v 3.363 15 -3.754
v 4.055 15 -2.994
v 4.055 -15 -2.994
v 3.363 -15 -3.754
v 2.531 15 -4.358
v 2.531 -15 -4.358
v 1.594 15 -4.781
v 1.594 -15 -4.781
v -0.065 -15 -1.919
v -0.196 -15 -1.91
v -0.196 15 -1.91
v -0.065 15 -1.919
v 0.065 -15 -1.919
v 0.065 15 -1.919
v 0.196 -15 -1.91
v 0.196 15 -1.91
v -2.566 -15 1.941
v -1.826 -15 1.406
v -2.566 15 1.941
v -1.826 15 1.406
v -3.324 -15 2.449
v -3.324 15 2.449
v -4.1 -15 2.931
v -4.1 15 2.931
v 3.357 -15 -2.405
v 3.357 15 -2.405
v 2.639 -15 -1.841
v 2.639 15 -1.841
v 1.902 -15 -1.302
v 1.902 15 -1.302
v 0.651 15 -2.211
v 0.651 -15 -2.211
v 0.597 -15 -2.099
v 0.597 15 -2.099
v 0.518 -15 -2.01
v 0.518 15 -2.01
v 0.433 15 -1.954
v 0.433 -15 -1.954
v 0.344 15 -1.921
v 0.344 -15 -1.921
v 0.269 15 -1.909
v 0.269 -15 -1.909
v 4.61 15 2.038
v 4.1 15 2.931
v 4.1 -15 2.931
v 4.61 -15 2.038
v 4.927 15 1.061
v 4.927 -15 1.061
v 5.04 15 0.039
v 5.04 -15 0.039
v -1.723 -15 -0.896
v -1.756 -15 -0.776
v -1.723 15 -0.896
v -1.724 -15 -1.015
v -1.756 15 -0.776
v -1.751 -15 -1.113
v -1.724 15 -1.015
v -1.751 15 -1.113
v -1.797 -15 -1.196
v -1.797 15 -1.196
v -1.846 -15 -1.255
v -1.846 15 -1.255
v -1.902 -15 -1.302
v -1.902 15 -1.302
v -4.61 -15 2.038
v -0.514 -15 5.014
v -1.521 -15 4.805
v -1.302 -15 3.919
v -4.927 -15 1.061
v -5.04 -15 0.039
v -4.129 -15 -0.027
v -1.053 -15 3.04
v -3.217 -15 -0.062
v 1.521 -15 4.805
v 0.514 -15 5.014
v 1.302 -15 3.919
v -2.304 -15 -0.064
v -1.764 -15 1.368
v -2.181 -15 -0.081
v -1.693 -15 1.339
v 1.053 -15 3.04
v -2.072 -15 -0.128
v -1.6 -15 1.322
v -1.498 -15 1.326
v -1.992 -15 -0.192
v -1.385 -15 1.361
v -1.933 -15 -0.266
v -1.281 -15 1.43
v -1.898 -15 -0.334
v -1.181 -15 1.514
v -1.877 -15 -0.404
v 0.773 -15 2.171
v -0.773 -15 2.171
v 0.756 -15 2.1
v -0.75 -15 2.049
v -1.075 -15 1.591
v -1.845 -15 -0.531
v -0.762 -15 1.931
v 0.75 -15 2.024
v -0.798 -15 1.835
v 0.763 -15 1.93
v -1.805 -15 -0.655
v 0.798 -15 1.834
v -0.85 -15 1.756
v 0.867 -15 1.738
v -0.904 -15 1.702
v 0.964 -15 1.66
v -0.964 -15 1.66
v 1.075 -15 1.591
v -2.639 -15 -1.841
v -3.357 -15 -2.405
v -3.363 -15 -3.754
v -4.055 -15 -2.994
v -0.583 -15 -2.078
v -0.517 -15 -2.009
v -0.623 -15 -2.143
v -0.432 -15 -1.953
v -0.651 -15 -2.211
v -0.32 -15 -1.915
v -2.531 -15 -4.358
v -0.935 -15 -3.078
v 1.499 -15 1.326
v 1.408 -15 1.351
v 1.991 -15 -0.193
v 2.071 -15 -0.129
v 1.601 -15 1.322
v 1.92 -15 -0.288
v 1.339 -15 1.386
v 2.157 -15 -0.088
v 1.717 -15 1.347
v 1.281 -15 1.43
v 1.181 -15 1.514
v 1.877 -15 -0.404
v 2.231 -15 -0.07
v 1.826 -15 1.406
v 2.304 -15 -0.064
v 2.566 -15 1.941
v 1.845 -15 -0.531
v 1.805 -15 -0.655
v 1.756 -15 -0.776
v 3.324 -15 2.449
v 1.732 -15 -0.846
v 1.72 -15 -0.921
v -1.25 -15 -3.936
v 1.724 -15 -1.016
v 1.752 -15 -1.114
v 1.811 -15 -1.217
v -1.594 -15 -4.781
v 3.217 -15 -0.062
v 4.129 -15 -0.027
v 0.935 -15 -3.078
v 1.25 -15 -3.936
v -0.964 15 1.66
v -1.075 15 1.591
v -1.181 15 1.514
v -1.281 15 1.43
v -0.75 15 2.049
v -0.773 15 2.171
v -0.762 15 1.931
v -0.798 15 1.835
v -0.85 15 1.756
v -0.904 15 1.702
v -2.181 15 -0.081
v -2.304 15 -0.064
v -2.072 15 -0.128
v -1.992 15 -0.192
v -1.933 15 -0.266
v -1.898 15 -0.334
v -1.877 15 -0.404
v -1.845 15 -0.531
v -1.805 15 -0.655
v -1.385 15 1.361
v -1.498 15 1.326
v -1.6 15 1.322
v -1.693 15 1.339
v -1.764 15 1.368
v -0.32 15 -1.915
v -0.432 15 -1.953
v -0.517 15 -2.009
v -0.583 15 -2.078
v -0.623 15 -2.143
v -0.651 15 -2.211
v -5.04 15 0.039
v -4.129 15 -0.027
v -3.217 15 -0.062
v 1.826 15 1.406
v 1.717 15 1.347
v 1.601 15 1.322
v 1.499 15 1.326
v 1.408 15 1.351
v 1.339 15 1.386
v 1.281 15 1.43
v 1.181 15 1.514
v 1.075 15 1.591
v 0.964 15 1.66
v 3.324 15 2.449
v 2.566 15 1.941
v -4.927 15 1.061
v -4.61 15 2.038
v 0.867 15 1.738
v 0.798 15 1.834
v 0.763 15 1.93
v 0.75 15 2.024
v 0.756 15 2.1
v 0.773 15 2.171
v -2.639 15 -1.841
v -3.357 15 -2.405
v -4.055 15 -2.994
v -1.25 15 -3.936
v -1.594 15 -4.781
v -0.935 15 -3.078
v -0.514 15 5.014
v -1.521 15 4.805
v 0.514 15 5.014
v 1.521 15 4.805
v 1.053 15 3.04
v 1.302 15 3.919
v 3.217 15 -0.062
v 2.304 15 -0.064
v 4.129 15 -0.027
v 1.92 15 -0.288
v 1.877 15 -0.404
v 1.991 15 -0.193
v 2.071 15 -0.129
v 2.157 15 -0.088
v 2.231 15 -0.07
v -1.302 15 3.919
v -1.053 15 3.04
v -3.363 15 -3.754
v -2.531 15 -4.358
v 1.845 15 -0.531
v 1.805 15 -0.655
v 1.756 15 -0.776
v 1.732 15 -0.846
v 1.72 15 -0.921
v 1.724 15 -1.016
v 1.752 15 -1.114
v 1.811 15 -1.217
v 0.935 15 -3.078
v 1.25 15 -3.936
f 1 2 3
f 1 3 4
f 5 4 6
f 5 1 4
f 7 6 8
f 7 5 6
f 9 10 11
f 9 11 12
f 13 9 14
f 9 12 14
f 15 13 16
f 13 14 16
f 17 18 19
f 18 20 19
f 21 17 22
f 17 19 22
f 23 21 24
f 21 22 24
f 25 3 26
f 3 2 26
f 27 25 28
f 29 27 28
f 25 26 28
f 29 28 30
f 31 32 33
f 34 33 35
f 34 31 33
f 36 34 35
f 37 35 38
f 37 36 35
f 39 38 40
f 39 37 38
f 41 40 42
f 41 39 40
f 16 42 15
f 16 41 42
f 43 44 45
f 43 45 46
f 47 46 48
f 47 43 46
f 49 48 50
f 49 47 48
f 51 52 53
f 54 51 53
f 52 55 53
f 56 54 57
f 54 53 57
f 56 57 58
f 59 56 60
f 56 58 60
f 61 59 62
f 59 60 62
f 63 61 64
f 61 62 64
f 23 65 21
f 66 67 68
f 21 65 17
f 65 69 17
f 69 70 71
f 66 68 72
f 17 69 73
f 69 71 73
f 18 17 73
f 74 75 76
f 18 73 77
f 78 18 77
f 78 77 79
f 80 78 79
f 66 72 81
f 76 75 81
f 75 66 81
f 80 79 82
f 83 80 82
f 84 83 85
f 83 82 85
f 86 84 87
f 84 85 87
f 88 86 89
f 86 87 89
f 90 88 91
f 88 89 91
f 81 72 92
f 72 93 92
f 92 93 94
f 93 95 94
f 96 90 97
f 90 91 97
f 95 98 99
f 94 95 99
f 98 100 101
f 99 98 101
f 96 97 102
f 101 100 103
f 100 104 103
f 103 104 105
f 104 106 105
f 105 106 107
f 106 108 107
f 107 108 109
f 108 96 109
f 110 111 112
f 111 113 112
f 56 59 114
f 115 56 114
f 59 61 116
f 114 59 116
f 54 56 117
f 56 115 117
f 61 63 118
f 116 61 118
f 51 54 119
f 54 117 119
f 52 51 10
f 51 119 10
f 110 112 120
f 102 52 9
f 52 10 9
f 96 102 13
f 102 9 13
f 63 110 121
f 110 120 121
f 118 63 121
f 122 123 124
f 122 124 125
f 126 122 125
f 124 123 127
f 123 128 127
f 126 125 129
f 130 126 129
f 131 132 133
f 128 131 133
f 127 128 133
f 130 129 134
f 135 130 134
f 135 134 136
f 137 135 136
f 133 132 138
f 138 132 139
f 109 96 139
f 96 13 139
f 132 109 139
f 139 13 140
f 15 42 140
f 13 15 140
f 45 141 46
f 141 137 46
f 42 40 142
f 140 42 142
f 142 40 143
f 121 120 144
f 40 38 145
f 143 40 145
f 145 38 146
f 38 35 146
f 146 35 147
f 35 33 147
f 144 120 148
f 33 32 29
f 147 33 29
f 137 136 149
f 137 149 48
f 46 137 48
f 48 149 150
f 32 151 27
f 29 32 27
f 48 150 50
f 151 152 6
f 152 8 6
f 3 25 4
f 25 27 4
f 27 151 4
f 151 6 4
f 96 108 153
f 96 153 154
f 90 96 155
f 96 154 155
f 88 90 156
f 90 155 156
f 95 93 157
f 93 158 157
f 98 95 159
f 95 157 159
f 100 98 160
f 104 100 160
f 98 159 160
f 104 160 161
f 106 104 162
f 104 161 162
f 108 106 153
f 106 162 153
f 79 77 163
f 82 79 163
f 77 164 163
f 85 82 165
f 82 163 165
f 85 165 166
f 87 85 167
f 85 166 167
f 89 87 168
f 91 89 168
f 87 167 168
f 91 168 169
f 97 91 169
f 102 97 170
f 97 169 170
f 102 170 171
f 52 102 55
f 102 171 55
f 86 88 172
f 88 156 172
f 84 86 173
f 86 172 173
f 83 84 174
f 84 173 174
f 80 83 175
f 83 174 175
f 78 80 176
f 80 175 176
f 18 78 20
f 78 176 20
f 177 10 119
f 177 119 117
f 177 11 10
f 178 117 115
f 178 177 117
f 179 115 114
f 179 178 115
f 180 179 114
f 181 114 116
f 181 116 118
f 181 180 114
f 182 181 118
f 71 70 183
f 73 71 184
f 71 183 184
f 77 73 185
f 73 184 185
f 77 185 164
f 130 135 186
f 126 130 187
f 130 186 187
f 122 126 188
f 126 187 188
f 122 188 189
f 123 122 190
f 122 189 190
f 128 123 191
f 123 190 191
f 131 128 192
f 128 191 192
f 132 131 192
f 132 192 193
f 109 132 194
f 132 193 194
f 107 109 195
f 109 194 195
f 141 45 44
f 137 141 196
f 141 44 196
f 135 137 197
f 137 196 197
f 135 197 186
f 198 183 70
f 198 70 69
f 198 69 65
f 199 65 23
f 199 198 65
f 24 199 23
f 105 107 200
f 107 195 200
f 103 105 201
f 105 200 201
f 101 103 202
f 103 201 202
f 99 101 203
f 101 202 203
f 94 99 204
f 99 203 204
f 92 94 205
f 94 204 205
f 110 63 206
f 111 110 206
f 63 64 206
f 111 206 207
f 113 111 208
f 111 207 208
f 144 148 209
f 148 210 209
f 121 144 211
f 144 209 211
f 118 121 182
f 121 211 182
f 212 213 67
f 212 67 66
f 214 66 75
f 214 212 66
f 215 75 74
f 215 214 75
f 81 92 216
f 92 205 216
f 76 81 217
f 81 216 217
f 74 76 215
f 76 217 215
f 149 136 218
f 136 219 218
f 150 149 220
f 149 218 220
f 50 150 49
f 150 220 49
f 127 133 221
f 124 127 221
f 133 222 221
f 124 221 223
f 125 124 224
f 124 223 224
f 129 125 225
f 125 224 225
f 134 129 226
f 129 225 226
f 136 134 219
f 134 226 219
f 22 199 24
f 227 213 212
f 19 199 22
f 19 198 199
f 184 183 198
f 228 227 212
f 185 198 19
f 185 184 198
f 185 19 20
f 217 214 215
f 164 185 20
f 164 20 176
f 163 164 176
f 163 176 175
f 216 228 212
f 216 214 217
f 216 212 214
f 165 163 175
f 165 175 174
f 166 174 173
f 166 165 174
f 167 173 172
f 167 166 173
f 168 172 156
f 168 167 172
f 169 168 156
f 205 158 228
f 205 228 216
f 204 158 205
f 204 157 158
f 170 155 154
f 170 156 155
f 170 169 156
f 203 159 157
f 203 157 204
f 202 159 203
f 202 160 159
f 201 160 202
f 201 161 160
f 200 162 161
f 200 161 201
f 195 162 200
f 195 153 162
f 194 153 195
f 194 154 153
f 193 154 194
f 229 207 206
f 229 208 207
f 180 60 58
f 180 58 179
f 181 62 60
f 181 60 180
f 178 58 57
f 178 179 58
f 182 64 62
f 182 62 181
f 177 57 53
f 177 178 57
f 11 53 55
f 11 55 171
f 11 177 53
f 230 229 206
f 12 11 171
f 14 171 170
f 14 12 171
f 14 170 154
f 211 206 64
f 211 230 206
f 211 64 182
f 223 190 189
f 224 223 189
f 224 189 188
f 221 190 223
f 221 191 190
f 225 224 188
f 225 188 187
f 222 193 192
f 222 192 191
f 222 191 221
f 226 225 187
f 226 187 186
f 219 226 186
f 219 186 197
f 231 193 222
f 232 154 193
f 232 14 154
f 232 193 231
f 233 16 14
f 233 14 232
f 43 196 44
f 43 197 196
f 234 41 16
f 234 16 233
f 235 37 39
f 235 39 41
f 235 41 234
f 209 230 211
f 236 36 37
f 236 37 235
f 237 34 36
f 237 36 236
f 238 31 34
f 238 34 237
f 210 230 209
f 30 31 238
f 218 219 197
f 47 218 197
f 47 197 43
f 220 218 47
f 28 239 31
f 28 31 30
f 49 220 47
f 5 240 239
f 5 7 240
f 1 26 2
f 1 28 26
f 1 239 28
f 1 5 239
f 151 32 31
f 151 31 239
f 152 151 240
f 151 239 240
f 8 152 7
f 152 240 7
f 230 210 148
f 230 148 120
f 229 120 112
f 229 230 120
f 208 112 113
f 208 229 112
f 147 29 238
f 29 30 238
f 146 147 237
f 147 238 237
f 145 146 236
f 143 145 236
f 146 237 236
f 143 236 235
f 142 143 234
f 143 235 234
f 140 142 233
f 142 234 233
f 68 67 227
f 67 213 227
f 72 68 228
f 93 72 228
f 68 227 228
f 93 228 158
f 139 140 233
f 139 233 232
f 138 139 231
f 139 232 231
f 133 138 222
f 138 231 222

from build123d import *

# Parameters (mm, degrees)
SKETCH1_R                = 5.04
BOSS_EXTRUDE1_DEPTH      = 15
CUT_EXTRUDE1_DEPTH       = 15
FILLET2_R                = 0.43
CIRPATTERN1_COUNT        = 5
FILLET2_OF_CIRPATTERN1_R = 0.43


with BuildPart() as part:
    # Sketch1 → Boss-Extrude1 (new body, symmetric)
    with BuildSketch(Plane(origin=(0, 0, 0), x_dir=(1, 0, 0), z_dir=(0, 1, 0))):
        Circle(SKETCH1_R)
    extrude(amount=BOSS_EXTRUDE1_DEPTH, both=True)

    # Sketch2 → Cut-Extrude1 (cut, symmetric)
    with BuildSketch(Plane(origin=(0, 0, 0), x_dir=(1, 0, 0), z_dir=(0, 1, 0))):
        with BuildLine():
            ThreePointArc((-1.594286027, 4.781197764), (-1.02324782, 3.327591934), (-0.539761549, 1.842568173))
            ThreePointArc((-0.539761549, 1.842568173), (0, 1.92), (0.539761549, 1.842568173))
            ThreePointArc((0.539761549, 1.842568173), (1.02324782, 3.327591934), (1.594286027, 4.781197764))
            ThreePointArc((1.594286027, 4.781197764), (0, 5.04), (-1.594286027, 4.781197764))
        make_face()
    cut_extrude1 = extrude(amount=CUT_EXTRUDE1_DEPTH, both=True, mode=Mode.SUBTRACT)

    # Fillet2
    fillet2_edges = [part.edges().sort_by_distance(p)[0] for p in [
        (0.539761549, 0, -1.842568173),
        (-0.539761549, 0, -1.842568173),
    ]]
    fillet(fillet2_edges, radius=FILLET2_R)

    # CirPattern1: Cut-Extrude1 ×5 about axis
    cirpattern1_axis = Axis((0, 0, 0), (0, 1, 0))
    for i in range(1, CIRPATTERN1_COUNT):
        add(cut_extrude1.rotate(cirpattern1_axis, i * 360 / CIRPATTERN1_COUNT), mode=Mode.SUBTRACT)

    # Fillet2 of CirPattern1
    fillet2_of_cirpattern1_edges = [part.edges().sort_by_distance(p)[0] for p in [
        (-1.585590976, 0, -1.082728617),
        (-1.919181959, 0, -0.05604114),
        (-1.519710664, 0, 1.173405087),
        (-0.646358132, 0, 1.807932843),
        (0.646358132, 0, 1.807932843),
        (1.519710664, 0, 1.173405087),
        (1.919181959, 0, -0.05604114),
        (1.585590976, 0, -1.082728617),
    ]]
    fillet(fillet2_of_cirpattern1_edges, radius=FILLET2_OF_CIRPATTERN1_R)


solid = part.part
